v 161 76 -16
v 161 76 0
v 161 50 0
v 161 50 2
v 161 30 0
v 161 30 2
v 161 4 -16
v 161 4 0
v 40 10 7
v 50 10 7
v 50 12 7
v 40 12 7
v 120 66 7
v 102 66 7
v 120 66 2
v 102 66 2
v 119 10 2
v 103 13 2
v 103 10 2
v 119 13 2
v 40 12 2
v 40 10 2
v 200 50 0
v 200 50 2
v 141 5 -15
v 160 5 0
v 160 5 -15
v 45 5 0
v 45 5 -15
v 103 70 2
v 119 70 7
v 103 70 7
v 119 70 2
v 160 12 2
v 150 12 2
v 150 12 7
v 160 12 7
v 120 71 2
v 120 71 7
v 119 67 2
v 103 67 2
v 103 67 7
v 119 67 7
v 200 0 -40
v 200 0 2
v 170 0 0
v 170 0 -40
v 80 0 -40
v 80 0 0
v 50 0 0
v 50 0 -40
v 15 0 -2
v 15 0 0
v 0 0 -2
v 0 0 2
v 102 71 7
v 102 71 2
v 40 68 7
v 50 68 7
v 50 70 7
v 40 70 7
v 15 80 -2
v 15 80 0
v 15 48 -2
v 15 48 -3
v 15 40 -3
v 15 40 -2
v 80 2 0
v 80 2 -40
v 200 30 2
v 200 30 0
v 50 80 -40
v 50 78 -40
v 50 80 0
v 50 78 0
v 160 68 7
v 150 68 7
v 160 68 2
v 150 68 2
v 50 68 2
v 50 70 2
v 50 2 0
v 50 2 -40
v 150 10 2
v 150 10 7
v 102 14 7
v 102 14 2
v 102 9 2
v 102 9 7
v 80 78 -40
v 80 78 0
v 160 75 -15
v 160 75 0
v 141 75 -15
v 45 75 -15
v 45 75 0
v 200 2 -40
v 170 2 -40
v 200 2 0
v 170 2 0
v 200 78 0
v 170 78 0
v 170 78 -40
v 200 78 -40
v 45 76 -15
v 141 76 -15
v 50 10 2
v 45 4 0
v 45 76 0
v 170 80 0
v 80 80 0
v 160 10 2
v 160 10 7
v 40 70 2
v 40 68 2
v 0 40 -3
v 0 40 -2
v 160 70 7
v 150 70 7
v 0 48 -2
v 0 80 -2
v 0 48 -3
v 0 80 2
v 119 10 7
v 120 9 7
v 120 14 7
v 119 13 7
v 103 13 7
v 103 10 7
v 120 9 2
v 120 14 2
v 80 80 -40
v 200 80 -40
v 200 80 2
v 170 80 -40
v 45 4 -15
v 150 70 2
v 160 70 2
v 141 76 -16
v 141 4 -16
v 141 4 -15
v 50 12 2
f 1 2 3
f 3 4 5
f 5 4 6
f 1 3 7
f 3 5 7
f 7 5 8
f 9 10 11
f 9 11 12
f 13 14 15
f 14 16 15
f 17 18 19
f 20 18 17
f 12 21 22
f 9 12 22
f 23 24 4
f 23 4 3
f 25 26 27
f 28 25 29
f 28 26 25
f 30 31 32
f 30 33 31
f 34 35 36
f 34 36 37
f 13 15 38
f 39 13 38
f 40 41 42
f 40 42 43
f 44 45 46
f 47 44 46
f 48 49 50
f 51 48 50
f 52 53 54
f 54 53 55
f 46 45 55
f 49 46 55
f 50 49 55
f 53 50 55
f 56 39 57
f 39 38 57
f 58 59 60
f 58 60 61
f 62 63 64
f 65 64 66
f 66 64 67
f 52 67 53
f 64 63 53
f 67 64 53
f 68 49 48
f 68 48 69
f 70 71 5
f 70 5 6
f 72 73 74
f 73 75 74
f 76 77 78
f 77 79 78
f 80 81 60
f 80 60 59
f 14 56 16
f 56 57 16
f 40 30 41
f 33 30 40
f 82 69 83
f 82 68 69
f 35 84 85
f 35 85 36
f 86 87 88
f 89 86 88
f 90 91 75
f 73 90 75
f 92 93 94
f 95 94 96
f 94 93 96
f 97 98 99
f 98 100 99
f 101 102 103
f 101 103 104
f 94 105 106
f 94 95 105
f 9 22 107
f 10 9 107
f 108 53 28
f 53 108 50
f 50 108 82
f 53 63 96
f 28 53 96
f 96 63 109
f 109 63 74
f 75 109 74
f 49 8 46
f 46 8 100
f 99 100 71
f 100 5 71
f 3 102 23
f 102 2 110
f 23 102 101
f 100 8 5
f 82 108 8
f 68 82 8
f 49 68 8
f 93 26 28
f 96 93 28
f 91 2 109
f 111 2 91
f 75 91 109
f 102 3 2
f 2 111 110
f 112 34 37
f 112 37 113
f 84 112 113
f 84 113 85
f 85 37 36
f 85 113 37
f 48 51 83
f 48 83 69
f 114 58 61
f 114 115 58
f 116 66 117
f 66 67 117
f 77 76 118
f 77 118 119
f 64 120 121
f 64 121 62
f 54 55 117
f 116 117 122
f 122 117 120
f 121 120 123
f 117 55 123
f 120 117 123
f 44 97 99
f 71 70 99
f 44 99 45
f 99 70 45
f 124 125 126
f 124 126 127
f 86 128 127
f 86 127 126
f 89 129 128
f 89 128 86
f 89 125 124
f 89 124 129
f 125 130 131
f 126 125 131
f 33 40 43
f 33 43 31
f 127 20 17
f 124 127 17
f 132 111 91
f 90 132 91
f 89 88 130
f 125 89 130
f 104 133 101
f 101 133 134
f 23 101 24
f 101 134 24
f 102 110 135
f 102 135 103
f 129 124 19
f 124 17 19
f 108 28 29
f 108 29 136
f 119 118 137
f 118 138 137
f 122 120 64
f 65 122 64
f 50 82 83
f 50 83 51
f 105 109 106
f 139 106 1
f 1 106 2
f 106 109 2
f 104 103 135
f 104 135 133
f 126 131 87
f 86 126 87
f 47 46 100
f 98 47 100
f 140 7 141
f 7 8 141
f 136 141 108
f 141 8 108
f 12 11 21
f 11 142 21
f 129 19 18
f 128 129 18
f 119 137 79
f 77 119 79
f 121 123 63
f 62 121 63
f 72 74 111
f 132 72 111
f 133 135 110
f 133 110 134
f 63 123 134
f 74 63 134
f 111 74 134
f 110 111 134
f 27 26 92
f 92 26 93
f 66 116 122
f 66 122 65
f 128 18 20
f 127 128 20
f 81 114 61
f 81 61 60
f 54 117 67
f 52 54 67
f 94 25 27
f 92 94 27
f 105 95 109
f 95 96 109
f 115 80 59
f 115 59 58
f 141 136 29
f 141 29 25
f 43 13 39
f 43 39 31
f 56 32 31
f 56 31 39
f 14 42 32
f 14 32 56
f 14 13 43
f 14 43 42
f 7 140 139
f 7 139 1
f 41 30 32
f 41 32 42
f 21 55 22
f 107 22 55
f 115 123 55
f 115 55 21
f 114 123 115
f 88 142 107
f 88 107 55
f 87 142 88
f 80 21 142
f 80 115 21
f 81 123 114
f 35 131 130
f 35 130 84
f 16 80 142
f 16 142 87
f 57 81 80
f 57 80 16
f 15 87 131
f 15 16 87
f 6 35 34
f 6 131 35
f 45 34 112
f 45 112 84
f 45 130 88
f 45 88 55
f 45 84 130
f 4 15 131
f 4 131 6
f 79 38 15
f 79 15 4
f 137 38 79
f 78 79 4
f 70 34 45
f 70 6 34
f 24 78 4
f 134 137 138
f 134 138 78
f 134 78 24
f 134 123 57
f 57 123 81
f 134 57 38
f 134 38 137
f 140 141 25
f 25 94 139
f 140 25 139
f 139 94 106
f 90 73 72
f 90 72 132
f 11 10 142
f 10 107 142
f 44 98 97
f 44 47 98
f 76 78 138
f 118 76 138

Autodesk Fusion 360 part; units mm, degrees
sketch "Sketch1" plane through (0, 0, 0) normal (0, 0, 1) x (1, 0, 0)
  line L0 (0, 0) -> (200, 0)
  line L1 (200, 0) -> (200, 80)
  line L2 (200, 80) -> (0, 80)
  line L3 (0, 80) -> (0, 0)
  dimension "d1" = 200
  dimension "d2" = 80
  dimension "d58" = 0
  dimension "d59" = 0
  dimension "d60" = 0
  dimension "d61" = 0
  dimension "d125" = 0
  dimension "d126" = 0
  dimension "d127" = 0
  dimension "d128" = 0
extrude "Extrude1" add sketch "Sketch1" along normal blind 2
sketch "Sketch2" plane through (0, 0, 2) normal (0, 0, 1) x (-1, 0, 0)
  line L0 (0, -80) -> (0, 0)
  line L1 (0, 0) -> (-200, 0)
  line L2 (-200, 0) -> (-200, -80)
  line L3 (-200, -80) -> (0, -80)
  line L4 (-40, -70) -> (-50, -70)
  line L5 (-50, -70) -> (-50, -68)
  line L6 (-50, -68) -> (-40, -68)
  line L7 (-40, -68) -> (-40, -70)
  dimension "d5" = 10
  dimension "d6" = 2
  dimension "d9" = 10
  dimension "d10" = 40
extrude "Extrude2" add sketch "Sketch2" along normal blind 5 contours L4 L5 L6 L7
sketch "Sketch3" plane through (0, 0, 2) normal (0, 0, 1) x (-1, 0, 0)
  line L0 (-40, -68) -> (-40, -70)
  line L1 (-40, -70) -> (-50, -70)
  line L2 (-50, -70) -> (-50, -68)
  line L3 (-50, -68) -> (-40, -68)
  line L4 (0, -80) -> (0, 0)
  line L5 (0, 0) -> (-200, 0)
  line L6 (-200, 0) -> (-200, -80)
  line L7 (-200, -80) -> (0, -80)
  line L8 (-40, -10) -> (-50, -10)
  line L9 (-50, -10) -> (-50, -12)
  line L10 (-50, -12) -> (-40, -12)
  line L11 (-40, -12) -> (-40, -10)
  dimension "d11" = 10
  dimension "d12" = 2
  dimension "d13" = 10
  dimension "d14" = 40
extrude "Extrude3" add sketch "Sketch3" along normal blind 5 contours L8 L9 L10 L11
sketch "Sketch4" plane through (0, 0, 2) normal (0, 0, 1) x (-1, 0, 0)
  line L0 (-40, -12) -> (-50, -12)
  line L1 (-50, -12) -> (-50, -10)
  line L2 (-50, -10) -> (-40, -10)
  line L3 (-40, -10) -> (-40, -12)
  line L4 (-40, -68) -> (-40, -70)
  line L5 (-40, -70) -> (-50, -70)
  line L6 (-50, -70) -> (-50, -68)
  line L7 (-50, -68) -> (-40, -68)
  line L8 (0, -80) -> (0, 0)
  line L9 (0, 0) -> (-200, 0)
  line L10 (-200, 0) -> (-200, -80)
  line L11 (-200, -80) -> (0, -80)
  line L12 (-160, -10) -> (-150, -10)
  line L13 (-150, -10) -> (-150, -12)
  line L14 (-150, -12) -> (-160, -12)
  line L15 (-160, -12) -> (-160, -10)
  dimension "d17" = 10
  dimension "d18" = 2
  dimension "d19" = 40
  dimension "d20" = 10
extrude "Extrude4" add sketch "Sketch4" along normal blind 5 contours L12 L13 L14 L15
sketch "Sketch5" plane through (0, 0, 2) normal (0, 0, 1) x (-1, 0, 0)
  line L0 (-160, -12) -> (-160, -10)
  line L1 (-160, -10) -> (-150, -10)
  line L2 (-150, -10) -> (-150, -12)
  line L3 (-150, -12) -> (-160, -12)
  line L4 (-40, -12) -> (-50, -12)
  line L5 (-50, -12) -> (-50, -10)
  line L6 (-50, -10) -> (-40, -10)
  line L7 (-40, -10) -> (-40, -12)
  line L8 (-40, -68) -> (-40, -70)
  line L9 (-40, -70) -> (-50, -70)
  line L10 (-50, -70) -> (-50, -68)
  line L11 (-50, -68) -> (-40, -68)
  line L12 (0, -80) -> (0, 0)
  line L13 (0, 0) -> (-200, 0)
  line L14 (-200, 0) -> (-200, -80)
  line L15 (-200, -80) -> (0, -80)
  line L16 (-160, -70) -> (-150, -70)
  line L17 (-150, -70) -> (-150, -68)
  line L18 (-150, -68) -> (-160, -68)
  line L19 (-160, -68) -> (-160, -70)
  dimension "d23" = 10
  dimension "d24" = 2
  dimension "d25" = 40
  dimension "d26" = 10
extrude "Extrude5" add sketch "Sketch5" along normal blind 5 contours L16 L17 L18 L19
sketch "Sketch8" plane through (0, 0, 0) normal (0, 0, 1) x (1, 0, 0)
  line L0 (45, 4) -> (160, 4)
  line L1 (160, 4) -> (160, 5)
  line L2 (160, 5) -> (45, 5)
  line L3 (45, 5) -> (45, 4)
  line L4 (0, 0) -> (200, 0)
  line L5 (0, 80) -> (0, 0)
  dimension "d42" = 115
  dimension "d43" = 1
  dimension "d44" = 4
  dimension "d45" = 45
extrude "Extrude8" add sketch "Sketch8" against normal blind 15
sketch "Sketch9" plane through (0, 0, 0) normal (0, 0, -1) x (1, 0, 0)
  line L0 (45, -4) -> (160, -4)
  line L1 (160, -4) -> (160, -5)
  line L2 (160, -5) -> (45, -5)
  line L3 (45, -5) -> (45, -4)
  line L4 (0, 0) -> (0, -80)
  line L5 (0, -80) -> (200, -80)
  line L6 (200, -80) -> (200, 0)
  line L7 (200, 0) -> (0, 0)
  line L8 (45, -76) -> (160, -76)
  line L9 (160, -76) -> (160, -75)
  line L10 (160, -75) -> (45, -75)
  line L11 (45, -75) -> (45, -76)
  dimension "d48" = 115
  dimension "d49" = 1
  dimension "d50" = 4
  dimension "d51" = 45
extrude "Extrude9" add sketch "Sketch9" along normal blind 15 contours L8 L9 L10 L11
sketch "Sketch10" plane through (0, 0, 0) normal (0, 0, -1) x (1, 0, 0)
  line L0 (45, -75) -> (160, -75)
  line L1 (160, -75) -> (160, -76)
  line L2 (160, -76) -> (45, -76)
  line L3 (45, -76) -> (45, -75)
  line L4 (45, -4) -> (160, -4)
  line L5 (160, -4) -> (160, -5)
  line L6 (160, -5) -> (45, -5)
  line L7 (45, -5) -> (45, -4)
  line L8 (0, 0) -> (0, -80)
  line L9 (0, -80) -> (200, -80)
  line L10 (200, -80) -> (200, 0)
  line L11 (200, 0) -> (0, 0)
  line L12 (200, -80) -> (170, -80)
  line L13 (170, -80) -> (170, -78)
  line L14 (170, -78) -> (200, -78)
  line L15 (200, -78) -> (200, -80)
  dimension "d66" = 30
  dimension "d67" = 2
extrude "Extrude10" add sketch "Sketch10" along normal blind 40 contours L9 L10 L12 L13 L14 L15
sketch "Sketch11" plane through (0, 0, 0) normal (0, 0, -1) x (1, 0, 0)
  line L0 (170, -80) -> (170, -78)
  line L1 (170, -78) -> (200, -78)
  line L2 (200, -78) -> (200, 0)
  line L3 (200, 0) -> (0, 0)
  line L4 (0, 0) -> (0, -80)
  line L5 (0, -80) -> (170, -80)
  line L6 (45, -4) -> (160, -4)
  line L7 (160, -4) -> (160, -5)
  line L8 (160, -5) -> (45, -5)
  line L9 (45, -5) -> (45, -4)
  line L10 (45, -75) -> (160, -75)
  line L11 (160, -75) -> (160, -76)
  line L12 (160, -76) -> (45, -76)
  line L13 (45, -76) -> (45, -75)
  line L14 (200, 0) -> (170, 0)
  line L15 (170, 0) -> (170, -2)
  line L16 (170, -2) -> (200, -2)
  line L17 (200, -2) -> (200, 0)
  dimension "d70" = 2
  dimension "d71" = 30
extrude "Extrude11" add sketch "Sketch11" along normal blind 40 contours L2 L3 L14 L15 L16 L17
sketch "Sketch12" plane through (0, 0, 0) normal (0, 0, -1) x (1, 0, 0)
  line L0 (170, -2) -> (170, 0)
  line L1 (170, 0) -> (0, 0)
  line L2 (0, 0) -> (0, -80)
  line L3 (0, -80) -> (170, -80)
  line L4 (170, -80) -> (170, -78)
  line L5 (170, -78) -> (200, -78)
  line L6 (200, -78) -> (200, -2)
  line L7 (200, -2) -> (170, -2)
  line L8 (45, -4) -> (160, -4)
  line L9 (160, -4) -> (160, -5)
  line L10 (160, -5) -> (45, -5)
  line L11 (45, -5) -> (45, -4)
  line L12 (45, -75) -> (160, -75)
  line L13 (160, -75) -> (160, -76)
  line L14 (160, -76) -> (45, -76)
  line L15 (45, -76) -> (45, -75)
  line L16 (50, 0) -> (80, 0)
  line L17 (80, 0) -> (80, -2)
  line L18 (80, -2) -> (50, -2)
  line L19 (50, -2) -> (50, 0)
  dimension "d74" = 30
  dimension "d75" = 2
  dimension "d78" = 50
extrude "Extrude12" add sketch "Sketch12" along normal blind 40 contours L1 L16 L17 L18 L19
sketch "Sketch13" plane through (0, 0, 0) normal (0, 0, -1) x (1, 0, 0)
  line L0 (45, -75) -> (160, -75)
  line L1 (160, -75) -> (160, -76)
  line L2 (160, -76) -> (45, -76)
  line L3 (45, -76) -> (45, -75)
  line L4 (45, -4) -> (160, -4)
  line L5 (160, -4) -> (160, -5)
  line L6 (160, -5) -> (45, -5)
  line L7 (45, -5) -> (45, -4)
  line L8 (80, 0) -> (80, -2)
  line L9 (80, -2) -> (50, -2)
  line L10 (50, -2) -> (50, 0)
  line L11 (50, 0) -> (0, 0)
  line L12 (0, 0) -> (0, -80)
  line L13 (0, -80) -> (170, -80)
  line L14 (170, -80) -> (170, -78)
  line L15 (170, -78) -> (200, -78)
  line L16 (200, -78) -> (200, -2)
  line L17 (200, -2) -> (170, -2)
  line L18 (170, -2) -> (170, 0)
  line L19 (170, 0) -> (80, 0)
  line L20 (50, -80) -> (80, -80)
  line L21 (80, -80) -> (80, -78)
  line L22 (80, -78) -> (50, -78)
  line L23 (50, -78) -> (50, -80)
  point P0 (200, -78)
  point P1 (200, -2)
  dimension "d79" = 30
  dimension "d80" = 2
  dimension "d81" = 50
  dimension "d175" = 76
extrude "Extrude13" add sketch "Sketch13" along normal blind 40 contours L13 L20 L21 L22 L23
sketch "Sketch17" plane through (200, 0, 0) normal (1, 0, 0) x (0, 1, 0)
  line L0 (2, 0) -> (78, 0)
  line L1 (78, 0) -> (78, -40)
  line L2 (78, -40) -> (80, -40)
  line L3 (80, -40) -> (80, 2)
  line L4 (80, 2) -> (0, 2)
  line L5 (0, 2) -> (0, -40)
  line L6 (0, -40) -> (2, -40)
  line L7 (2, -40) -> (2, 0)
  line L8 (30, 2) -> (50, 2)
  line L9 (50, 2) -> (50, 0)
  line L10 (50, 0) -> (30, 0)
  line L11 (30, 0) -> (30, 2)
  dimension "d115" = 20
  dimension "d116" = 2
  dimension "d117" = 30
  dimension "d118" = 28.4712
extrude "Extrude15" cut sketch "Sketch17" against normal blind 39 contours L0 L4 L8 L9 L10 L11
sketch "Sketch21" plane through (0, 0, 0) normal (0, 0, -1) x (1, 0, 0)
  line L0 (45, -4) -> (160, -4)
  line L1 (160, -4) -> (160, -5)
  line L2 (160, -5) -> (45, -5)
  line L3 (45, -5) -> (45, -4)
  line L4 (45, -75) -> (160, -75)
  line L5 (160, -75) -> (160, -76)
  line L6 (160, -76) -> (45, -76)
  line L7 (45, -76) -> (45, -75)
  line L8 (200, -50) -> (161, -50)
  line L9 (161, -50) -> (161, -30)
  line L10 (161, -30) -> (200, -30)
  line L11 (200, -30) -> (200, -2)
  line L12 (200, -2) -> (170, -2)
  line L13 (170, -2) -> (170, 0)
  line L14 (170, 0) -> (80, 0)
  line L15 (80, 0) -> (80, -2)
  line L16 (80, -2) -> (50, -2)
  line L17 (50, -2) -> (50, 0)
  line L18 (50, 0) -> (0, 0)
  line L19 (0, 0) -> (0, -80)
  line L20 (0, -80) -> (50, -80)
  line L21 (50, -80) -> (50, -78)
  line L22 (50, -78) -> (80, -78)
  line L23 (80, -78) -> (80, -80)
  line L24 (80, -80) -> (170, -80)
  line L25 (170, -80) -> (170, -78)
  line L26 (170, -78) -> (200, -78)
  line L27 (200, -78) -> (200, -50)
  line L28 (0, -80) -> (15, -80)
  line L29 (15, -80) -> (15, 0)
  line L30 (15, 0) -> (0, 0)
  line L31 (0, 0) -> (0, -80)
extrude "Extrude20" add sketch "Sketch21" along normal blind 2 contours L18 L19 L20 L28 L29 L30 L31
sketch "Sketch23" plane through (0, 0, -2) normal (0, 0, -1) x (1, 0, 0)
  line L0 (0, 0) -> (0, -80)
  line L1 (0, -80) -> (15, -80)
  line L2 (15, -80) -> (15, 0)
  line L3 (15, 0) -> (0, 0)
  line L4 (15, -40) -> (0, -40)
  line L5 (0, -40) -> (0, -48)
  line L6 (0, -48) -> (15, -48)
  line L7 (15, -48) -> (15, -40)
  dimension "d168" = 8
extrude "Extrude21" add sketch "Sketch23" along normal blind 1 contours L0 L2 L4 L5 L6 L7
sketch "Sketch26" plane through (0, 0, 0) normal (0, 0, -1) x (1, 0, 0)
  line L0 (15, 0) -> (15, -80)
  line L1 (15, -80) -> (50, -80)
  line L2 (50, -80) -> (50, -78)
  line L3 (50, -78) -> (80, -78)
  line L4 (80, -78) -> (80, -80)
  line L5 (80, -80) -> (170, -80)
  line L6 (170, -80) -> (170, -78)
  line L7 (170, -78) -> (200, -78)
  line L8 (200, -78) -> (200, -50)
  line L9 (200, -50) -> (161, -50)
  line L10 (161, -50) -> (161, -30)
  line L11 (161, -30) -> (200, -30)
  line L12 (200, -30) -> (200, -2)
  line L13 (200, -2) -> (170, -2)
  line L14 (170, -2) -> (170, 0)
  line L15 (170, 0) -> (80, 0)
  line L16 (80, 0) -> (80, -2)
  line L17 (80, -2) -> (50, -2)
  line L18 (50, -2) -> (50, 0)
  line L19 (50, 0) -> (15, 0)
  line L20 (45, -4) -> (160, -4)
  line L21 (160, -4) -> (160, -5)
  line L22 (160, -5) -> (45, -5)
  line L23 (45, -5) -> (45, -4)
  line L24 (45, -75) -> (160, -75)
  line L25 (160, -75) -> (160, -76)
  line L26 (160, -76) -> (45, -76)
  line L27 (45, -76) -> (45, -75)
  line L28 (160, -76) -> (161, -76)
  line L29 (161, -76) -> (161, -4)
  line L30 (161, -4) -> (160, -4)
  line L31 (160, -4) -> (160, -76)
  dimension "d178" = 1
extrude "Extrude22" add sketch "Sketch26" along normal blind 15 contours L10 L21 L25 L28 L29 L30 L31
sketch "Sketch28" plane through (0, 0, -15) normal (0, 0, -1) x (1, 0, 0)
  line L0 (45, -75) -> (45, -76)
  line L1 (45, -76) -> (161, -76)
  line L2 (161, -76) -> (161, -4)
  line L3 (161, -4) -> (45, -4)
  line L4 (45, -4) -> (45, -5)
  line L5 (45, -5) -> (160, -5)
  line L6 (160, -5) -> (160, -75)
  line L7 (160, -75) -> (45, -75)
  line L8 (161, -4) -> (141, -4)
  line L9 (141, -4) -> (141, -76)
  line L10 (141, -76) -> (161, -76)
  line L11 (161, -76) -> (161, -4)
  dimension "d185" = 20
extrude "Extrude25" add sketch "Sketch28" along normal blind 1 contours L5 L6 L7 L9 | L1 L2 L3 L5 L6 L7 L8 L9 L10 L11
sketch "Sketch29" plane through (0, 0, 2) normal (0, 0, 1) x (-1, 0, 0)
  line L0 (-161, -50) -> (-200, -50)
  line L1 (-200, -50) -> (-200, -80)
  line L2 (-200, -80) -> (0, -80)
  line L3 (0, -80) -> (0, 0)
  line L4 (0, 0) -> (-200, 0)
  line L5 (-200, 0) -> (-200, -30)
  line L6 (-200, -30) -> (-161, -30)
  line L7 (-161, -30) -> (-161, -50)
  line L8 (-160, -68) -> (-150, -68)
  line L9 (-150, -68) -> (-150, -70)
  line L10 (-150, -70) -> (-160, -70)
  line L11 (-160, -70) -> (-160, -68)
  line L12 (-160, -12) -> (-160, -10)
  line L13 (-160, -10) -> (-150, -10)
  line L14 (-150, -10) -> (-150, -12)
  line L15 (-150, -12) -> (-160, -12)
  line L16 (-40, -12) -> (-50, -12)
  line L17 (-50, -12) -> (-50, -10)
  line L18 (-50, -10) -> (-40, -10)
  line L19 (-40, -10) -> (-40, -12)
  line L20 (-40, -68) -> (-40, -70)
  line L21 (-40, -70) -> (-50, -70)
  line L22 (-50, -70) -> (-50, -68)
  line L23 (-50, -68) -> (-40, -68)
  line L24 (-120, -71) -> (-102, -71)
  line L25 (-102, -71) -> (-102, -66)
  line L26 (-102, -66) -> (-120, -66)
  line L27 (-120, -66) -> (-120, -71)
  line L28 (-103, -67) -> (-119, -67)
  line L29 (-119, -67) -> (-119, -70)
  line L30 (-119, -70) -> (-103, -70)
  line L31 (-103, -70) -> (-103, -67)
  dimension "d190" = 18
  dimension "d191" = 5
  dimension "d192" = 80
  dimension "d193" = 9
  dimension "d194" = 1
  dimension "d195" = 1
extrude "Extrude26" add sketch "Sketch29" along normal blind 5 contours L24 L25 L26 L27
sketch "Sketch30" plane through (0, 0, 2) normal (0, 0, 1) x (-1, 0, 0)
  line L0 (-40, -68) -> (-40, -70)
  line L1 (-40, -70) -> (-50, -70)
  line L2 (-50, -70) -> (-50, -68)
  line L3 (-50, -68) -> (-40, -68)
  line L4 (-40, -12) -> (-50, -12)
  line L5 (-50, -12) -> (-50, -10)
  line L6 (-50, -10) -> (-40, -10)
  line L7 (-40, -10) -> (-40, -12)
  line L8 (-160, -12) -> (-160, -10)
  line L9 (-160, -10) -> (-150, -10)
  line L10 (-150, -10) -> (-150, -12)
  line L11 (-150, -12) -> (-160, -12)
  line L12 (-160, -68) -> (-150, -68)
  line L13 (-150, -68) -> (-150, -70)
  line L14 (-150, -70) -> (-160, -70)
  line L15 (-160, -70) -> (-160, -68)
  line L16 (-161, -50) -> (-200, -50)
  line L17 (-200, -50) -> (-200, -80)
  line L18 (-200, -80) -> (0, -80)
  line L19 (0, -80) -> (0, 0)
  line L20 (0, 0) -> (-200, 0)
  line L21 (-200, 0) -> (-200, -30)
  line L22 (-200, -30) -> (-161, -30)
  line L23 (-161, -30) -> (-161, -50)
  line L24 (-120, -66) -> (-102, -66)
  line L25 (-102, -66) -> (-102, -71)
  line L26 (-102, -71) -> (-120, -71)
  line L27 (-120, -71) -> (-120, -66)
  line L28 (-120, -14) -> (-102, -14)
  line L29 (-102, -14) -> (-102, -9)
  line L30 (-102, -9) -> (-120, -9)
  line L31 (-120, -9) -> (-120, -14)
  line L32 (-103, -13) -> (-119, -13)
  line L33 (-119, -13) -> (-119, -10)
  line L34 (-119, -10) -> (-103, -10)
  line L35 (-103, -10) -> (-103, -13)
  dimension "d198" = 18
  dimension "d199" = 5
  dimension "d200" = 1
  dimension "d201" = 9
extrude "Extrude27" add sketch "Sketch30" along normal blind 5 contours L28 L29 L30 L31
